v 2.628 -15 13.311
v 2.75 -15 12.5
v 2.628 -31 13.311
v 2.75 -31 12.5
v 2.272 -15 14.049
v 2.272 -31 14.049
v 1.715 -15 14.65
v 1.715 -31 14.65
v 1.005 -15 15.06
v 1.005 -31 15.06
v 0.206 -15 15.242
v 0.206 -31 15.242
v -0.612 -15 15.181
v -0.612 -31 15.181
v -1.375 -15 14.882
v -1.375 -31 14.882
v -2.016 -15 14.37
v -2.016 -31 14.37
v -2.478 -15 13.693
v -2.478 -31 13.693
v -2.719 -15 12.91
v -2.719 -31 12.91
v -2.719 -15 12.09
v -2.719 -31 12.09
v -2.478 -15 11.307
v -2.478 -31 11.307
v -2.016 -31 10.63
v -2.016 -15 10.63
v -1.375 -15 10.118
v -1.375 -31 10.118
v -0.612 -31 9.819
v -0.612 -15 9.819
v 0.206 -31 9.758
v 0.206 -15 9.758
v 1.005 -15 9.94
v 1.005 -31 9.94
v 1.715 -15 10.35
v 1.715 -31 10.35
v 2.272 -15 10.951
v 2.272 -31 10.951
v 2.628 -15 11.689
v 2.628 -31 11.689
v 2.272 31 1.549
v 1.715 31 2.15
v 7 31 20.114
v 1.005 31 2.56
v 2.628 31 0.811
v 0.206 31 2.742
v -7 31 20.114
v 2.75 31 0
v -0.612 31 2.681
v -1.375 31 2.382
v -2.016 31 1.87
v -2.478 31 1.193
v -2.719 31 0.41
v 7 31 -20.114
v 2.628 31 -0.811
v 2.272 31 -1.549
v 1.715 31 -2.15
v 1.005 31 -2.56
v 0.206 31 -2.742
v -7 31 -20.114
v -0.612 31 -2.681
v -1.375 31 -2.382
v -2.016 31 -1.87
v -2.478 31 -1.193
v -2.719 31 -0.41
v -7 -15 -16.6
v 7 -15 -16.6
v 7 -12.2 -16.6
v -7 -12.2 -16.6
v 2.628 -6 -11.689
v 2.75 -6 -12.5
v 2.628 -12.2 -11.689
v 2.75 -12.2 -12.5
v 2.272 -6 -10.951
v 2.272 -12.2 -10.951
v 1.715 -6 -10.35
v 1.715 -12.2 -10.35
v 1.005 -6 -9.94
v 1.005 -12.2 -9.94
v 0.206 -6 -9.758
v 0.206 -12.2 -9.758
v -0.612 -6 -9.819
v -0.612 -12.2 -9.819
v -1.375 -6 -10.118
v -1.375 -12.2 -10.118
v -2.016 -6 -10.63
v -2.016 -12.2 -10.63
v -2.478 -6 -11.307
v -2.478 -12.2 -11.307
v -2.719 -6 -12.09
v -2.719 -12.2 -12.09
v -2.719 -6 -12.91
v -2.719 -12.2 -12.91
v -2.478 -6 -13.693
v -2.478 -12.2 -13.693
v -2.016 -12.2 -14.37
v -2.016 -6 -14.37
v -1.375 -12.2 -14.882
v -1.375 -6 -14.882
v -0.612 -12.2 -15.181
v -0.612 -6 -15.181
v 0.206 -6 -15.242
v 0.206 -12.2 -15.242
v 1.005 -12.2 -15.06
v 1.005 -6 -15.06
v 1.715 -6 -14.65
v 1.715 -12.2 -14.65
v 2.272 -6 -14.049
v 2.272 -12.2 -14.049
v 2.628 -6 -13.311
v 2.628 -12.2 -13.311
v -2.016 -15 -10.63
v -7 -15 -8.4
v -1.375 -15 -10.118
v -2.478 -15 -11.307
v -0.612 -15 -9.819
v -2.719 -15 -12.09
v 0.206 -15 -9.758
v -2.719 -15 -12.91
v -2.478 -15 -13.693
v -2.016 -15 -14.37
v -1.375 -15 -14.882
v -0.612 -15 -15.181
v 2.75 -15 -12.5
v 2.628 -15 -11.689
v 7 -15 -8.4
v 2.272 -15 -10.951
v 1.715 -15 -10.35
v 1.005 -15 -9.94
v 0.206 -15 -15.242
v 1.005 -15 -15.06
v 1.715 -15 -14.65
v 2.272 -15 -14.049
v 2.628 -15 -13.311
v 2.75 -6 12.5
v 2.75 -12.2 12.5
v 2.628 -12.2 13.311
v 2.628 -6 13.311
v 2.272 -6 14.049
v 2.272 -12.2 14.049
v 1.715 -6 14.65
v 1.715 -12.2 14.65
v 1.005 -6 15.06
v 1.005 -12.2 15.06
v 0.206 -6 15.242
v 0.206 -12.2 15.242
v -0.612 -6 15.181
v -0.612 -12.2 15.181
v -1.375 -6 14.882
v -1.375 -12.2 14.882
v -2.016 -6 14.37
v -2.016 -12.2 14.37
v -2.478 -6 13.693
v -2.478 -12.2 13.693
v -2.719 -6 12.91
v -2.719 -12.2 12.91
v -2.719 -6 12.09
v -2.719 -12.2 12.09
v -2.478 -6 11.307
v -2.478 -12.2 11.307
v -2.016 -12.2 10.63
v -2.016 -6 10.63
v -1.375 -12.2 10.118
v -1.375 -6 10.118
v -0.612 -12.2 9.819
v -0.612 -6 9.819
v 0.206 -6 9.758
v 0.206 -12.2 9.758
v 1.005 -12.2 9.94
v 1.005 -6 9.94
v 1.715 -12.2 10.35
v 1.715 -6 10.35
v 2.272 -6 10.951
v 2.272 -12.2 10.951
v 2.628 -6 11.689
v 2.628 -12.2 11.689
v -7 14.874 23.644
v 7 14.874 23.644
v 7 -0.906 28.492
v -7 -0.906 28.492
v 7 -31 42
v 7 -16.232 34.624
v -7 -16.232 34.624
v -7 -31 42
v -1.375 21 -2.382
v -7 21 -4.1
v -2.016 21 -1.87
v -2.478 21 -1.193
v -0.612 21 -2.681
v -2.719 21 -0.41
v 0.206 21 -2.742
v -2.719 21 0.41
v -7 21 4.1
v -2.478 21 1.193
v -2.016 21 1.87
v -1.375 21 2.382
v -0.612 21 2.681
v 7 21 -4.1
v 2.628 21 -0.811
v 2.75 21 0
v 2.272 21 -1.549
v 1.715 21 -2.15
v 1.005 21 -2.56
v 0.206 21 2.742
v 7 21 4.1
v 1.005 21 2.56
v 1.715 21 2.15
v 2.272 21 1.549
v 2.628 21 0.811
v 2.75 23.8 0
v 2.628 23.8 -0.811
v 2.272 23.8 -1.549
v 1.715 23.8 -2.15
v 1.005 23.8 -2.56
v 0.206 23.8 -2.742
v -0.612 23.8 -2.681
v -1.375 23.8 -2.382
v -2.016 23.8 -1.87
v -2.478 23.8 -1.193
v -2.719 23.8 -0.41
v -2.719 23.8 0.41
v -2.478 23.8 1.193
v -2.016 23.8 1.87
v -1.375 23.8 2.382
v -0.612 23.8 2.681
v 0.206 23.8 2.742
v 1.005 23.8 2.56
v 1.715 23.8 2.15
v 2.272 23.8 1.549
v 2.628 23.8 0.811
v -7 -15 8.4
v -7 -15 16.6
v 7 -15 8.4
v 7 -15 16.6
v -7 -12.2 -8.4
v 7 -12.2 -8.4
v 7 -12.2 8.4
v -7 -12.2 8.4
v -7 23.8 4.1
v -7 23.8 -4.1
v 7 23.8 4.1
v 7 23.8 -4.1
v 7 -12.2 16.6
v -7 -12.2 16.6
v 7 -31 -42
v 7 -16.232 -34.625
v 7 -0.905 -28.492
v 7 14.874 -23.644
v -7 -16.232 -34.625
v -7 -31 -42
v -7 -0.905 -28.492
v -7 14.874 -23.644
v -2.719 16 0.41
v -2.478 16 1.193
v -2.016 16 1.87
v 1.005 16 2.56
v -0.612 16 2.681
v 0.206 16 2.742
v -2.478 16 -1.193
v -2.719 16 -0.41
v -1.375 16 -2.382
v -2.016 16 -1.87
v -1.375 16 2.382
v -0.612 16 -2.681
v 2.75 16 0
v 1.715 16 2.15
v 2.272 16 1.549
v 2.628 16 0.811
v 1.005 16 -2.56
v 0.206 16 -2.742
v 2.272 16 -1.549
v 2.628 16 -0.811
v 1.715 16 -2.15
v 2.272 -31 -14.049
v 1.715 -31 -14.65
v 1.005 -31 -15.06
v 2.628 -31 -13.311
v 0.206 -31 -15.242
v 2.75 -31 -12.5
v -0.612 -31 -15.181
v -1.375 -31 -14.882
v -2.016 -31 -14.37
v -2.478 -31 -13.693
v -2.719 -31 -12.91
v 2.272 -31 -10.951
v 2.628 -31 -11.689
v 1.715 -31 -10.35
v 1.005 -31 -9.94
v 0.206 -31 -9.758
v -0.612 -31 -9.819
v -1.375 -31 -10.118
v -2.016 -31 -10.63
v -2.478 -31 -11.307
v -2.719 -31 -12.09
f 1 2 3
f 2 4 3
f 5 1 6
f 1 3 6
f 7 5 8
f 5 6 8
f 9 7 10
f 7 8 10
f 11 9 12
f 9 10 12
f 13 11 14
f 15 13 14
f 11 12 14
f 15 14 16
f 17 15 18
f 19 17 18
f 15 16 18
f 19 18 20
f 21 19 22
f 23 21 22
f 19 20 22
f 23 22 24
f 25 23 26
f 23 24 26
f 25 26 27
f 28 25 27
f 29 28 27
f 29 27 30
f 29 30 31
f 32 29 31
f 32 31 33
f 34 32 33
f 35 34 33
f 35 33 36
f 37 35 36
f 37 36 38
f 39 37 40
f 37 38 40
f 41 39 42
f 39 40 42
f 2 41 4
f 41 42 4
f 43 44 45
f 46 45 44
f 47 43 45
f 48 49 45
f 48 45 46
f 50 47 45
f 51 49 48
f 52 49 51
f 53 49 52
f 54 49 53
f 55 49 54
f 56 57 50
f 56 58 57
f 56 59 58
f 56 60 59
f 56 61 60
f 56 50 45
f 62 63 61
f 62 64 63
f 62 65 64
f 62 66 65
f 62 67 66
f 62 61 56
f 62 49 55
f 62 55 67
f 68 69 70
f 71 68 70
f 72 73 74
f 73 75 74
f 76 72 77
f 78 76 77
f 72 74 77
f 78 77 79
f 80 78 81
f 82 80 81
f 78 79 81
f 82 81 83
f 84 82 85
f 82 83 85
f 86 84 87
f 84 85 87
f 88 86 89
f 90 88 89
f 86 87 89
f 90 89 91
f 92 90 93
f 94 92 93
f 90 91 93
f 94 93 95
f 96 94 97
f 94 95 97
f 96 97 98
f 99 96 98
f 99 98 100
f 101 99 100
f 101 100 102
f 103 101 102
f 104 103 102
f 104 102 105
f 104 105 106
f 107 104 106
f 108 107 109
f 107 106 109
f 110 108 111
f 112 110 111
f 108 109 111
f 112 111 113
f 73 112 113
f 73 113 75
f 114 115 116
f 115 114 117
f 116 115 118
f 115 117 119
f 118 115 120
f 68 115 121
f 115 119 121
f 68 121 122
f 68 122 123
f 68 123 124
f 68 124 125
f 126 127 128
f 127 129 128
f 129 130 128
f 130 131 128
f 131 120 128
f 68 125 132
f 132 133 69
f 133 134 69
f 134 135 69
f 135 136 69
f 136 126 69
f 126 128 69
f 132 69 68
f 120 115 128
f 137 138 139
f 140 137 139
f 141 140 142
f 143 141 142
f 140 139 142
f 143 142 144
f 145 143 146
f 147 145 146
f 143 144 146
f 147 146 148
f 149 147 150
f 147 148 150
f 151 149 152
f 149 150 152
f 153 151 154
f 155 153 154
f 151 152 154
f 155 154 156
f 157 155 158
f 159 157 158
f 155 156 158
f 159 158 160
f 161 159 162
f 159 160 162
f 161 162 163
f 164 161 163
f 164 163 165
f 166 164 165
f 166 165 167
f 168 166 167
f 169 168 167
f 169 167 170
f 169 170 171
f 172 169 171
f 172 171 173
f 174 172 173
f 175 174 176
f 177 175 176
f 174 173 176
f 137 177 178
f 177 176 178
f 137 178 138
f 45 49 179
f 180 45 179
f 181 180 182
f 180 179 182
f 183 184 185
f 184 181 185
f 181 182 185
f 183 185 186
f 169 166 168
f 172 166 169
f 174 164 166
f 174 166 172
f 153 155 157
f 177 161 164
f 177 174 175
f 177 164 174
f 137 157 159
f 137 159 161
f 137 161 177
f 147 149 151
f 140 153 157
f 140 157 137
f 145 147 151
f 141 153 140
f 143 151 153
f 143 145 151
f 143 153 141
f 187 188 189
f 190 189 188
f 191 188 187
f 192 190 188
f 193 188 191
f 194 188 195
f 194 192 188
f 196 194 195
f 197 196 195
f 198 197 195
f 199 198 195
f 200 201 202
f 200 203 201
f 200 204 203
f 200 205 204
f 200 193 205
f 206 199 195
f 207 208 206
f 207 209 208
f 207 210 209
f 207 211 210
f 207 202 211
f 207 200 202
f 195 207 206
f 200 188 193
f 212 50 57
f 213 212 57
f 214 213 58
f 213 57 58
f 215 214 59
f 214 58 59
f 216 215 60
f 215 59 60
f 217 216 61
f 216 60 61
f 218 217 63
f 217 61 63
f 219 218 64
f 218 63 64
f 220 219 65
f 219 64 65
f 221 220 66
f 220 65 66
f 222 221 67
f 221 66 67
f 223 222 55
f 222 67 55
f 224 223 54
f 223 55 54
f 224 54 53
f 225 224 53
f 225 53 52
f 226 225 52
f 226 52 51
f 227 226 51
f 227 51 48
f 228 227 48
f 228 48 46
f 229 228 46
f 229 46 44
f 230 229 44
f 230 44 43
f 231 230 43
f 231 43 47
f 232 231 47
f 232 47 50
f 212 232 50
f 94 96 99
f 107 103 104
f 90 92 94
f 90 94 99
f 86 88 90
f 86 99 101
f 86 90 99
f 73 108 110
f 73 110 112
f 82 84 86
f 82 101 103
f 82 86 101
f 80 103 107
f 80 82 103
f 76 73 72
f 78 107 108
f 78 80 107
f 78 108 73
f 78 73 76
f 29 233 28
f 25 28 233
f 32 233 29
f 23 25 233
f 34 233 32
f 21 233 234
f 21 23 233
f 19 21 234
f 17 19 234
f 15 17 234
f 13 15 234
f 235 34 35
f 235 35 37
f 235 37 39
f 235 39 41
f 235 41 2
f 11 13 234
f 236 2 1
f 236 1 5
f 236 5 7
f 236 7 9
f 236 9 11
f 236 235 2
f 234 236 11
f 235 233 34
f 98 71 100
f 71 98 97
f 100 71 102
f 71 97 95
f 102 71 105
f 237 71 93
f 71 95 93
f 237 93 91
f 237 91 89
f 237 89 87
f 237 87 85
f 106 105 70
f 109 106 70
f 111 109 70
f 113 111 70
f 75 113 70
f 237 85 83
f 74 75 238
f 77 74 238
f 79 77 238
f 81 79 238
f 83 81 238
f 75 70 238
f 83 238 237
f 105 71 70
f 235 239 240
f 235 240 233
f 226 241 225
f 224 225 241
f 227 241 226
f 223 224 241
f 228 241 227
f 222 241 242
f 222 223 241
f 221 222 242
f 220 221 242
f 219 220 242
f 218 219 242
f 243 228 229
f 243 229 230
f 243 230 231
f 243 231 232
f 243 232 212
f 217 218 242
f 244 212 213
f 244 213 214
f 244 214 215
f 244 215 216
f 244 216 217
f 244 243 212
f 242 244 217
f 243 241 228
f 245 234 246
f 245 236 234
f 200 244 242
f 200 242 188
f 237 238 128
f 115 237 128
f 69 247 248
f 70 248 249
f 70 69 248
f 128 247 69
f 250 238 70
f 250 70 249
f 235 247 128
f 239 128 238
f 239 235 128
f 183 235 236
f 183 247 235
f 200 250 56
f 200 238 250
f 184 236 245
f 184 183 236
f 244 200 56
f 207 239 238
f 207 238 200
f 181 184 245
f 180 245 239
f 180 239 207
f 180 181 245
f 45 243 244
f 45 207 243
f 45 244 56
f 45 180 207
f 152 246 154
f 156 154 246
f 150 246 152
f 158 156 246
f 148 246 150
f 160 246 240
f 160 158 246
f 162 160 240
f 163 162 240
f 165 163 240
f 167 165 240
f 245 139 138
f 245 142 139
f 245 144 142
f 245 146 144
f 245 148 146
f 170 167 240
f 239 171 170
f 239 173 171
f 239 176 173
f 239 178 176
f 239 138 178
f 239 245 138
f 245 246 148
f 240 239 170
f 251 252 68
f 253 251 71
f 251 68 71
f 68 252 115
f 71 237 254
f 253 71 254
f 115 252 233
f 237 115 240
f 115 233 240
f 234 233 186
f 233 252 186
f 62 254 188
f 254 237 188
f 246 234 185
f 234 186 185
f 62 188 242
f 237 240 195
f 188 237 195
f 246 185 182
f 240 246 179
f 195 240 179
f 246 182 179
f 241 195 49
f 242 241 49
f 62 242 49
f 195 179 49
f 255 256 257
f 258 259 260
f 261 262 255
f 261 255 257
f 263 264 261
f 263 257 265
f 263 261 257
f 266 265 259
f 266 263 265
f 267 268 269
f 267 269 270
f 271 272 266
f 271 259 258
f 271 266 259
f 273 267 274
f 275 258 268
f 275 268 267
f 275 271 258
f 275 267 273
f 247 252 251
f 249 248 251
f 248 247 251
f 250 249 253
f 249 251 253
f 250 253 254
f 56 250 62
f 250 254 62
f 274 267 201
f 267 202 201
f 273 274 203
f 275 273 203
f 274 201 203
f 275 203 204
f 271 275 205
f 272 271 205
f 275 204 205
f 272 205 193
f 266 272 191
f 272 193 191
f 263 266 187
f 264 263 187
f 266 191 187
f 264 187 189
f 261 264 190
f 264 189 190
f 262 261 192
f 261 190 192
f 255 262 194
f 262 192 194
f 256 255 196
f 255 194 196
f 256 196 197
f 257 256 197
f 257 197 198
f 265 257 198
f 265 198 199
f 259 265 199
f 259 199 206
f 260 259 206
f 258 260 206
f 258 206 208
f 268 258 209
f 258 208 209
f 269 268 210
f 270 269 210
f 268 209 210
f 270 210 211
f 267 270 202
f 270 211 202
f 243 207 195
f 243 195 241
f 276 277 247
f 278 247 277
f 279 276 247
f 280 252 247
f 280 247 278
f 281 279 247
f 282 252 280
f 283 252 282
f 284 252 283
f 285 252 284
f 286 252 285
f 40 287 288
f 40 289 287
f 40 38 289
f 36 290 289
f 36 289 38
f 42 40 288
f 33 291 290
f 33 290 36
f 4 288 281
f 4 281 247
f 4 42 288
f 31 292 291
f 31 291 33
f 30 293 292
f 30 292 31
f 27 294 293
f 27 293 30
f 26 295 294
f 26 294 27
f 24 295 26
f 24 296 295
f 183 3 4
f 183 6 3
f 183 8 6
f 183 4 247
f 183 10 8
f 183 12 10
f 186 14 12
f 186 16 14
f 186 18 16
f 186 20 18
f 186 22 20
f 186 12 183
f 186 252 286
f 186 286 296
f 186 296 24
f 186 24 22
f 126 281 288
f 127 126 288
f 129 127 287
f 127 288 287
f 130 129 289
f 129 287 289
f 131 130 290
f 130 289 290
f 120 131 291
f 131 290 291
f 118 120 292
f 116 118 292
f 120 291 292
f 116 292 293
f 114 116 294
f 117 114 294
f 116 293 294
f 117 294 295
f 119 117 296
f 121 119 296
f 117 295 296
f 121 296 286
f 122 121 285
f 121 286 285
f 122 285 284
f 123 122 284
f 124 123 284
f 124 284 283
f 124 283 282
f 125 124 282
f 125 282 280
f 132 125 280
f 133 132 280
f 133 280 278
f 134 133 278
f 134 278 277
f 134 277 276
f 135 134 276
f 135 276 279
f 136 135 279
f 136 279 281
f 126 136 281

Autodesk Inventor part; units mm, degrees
ref_plane "YZ Plane" through (0, 0, 0) normal (1, 0, 0) x (0, 1, 0)
ref_plane "XZ Plane" through (0, 0, 0) normal (0, 1, 0) x (-1, 0, 0)
ref_plane "XY Plane" through (0, 0, 0) normal (0, 0, 1) x (1, 0, 0)
sketch "Sketch1" plane through (0, 0, 0) normal (1, 0, 0) x (0, 1, 0)
  arc A0 (31, -20.1145) -> (-31, -42) centre (65.6672, -217.087) ccw
  line L0 (-31, 42) -> (31, 42) construction
  line L1 (31, 42) -> (31, -42) construction
  line L2 (31, -42) -> (-31, -42) construction
  line L3 (-31, -42) -> (-31, 42)
  line L4 (31, 0) -> (-31, 0) construction
  arc A1 (-31, 42) -> (31, 20.1145) centre (65.6672, 217.087) ccw
  line L5 (31, 20.1145) -> (31, -20.1145)
  point P0 (0, 0)
  point P1 (0, 42)
  dimension "d0" = 400
  dimension "d1" = 62
  dimension "d2" = 84
  dimension "d23" = 40.2289
extrude "Extrusion1" add sketch "Sketch1" along normal mid plane 14
sketch "Sketch2" plane through (7, 0, 0) normal (1, 0, 0) x (0, 0, -1)
  arc A0 (-42, -31) -> (-20.1145, 31) centre (-217.087, 65.6672) ccw construction
  line L0 (-42, -31) -> (42, -31) construction
  arc A1 (20.1145, 31) -> (42, -31) centre (217.087, 65.6672) ccw construction
  line L1 (20.1145, 31) -> (-20.1145, 31) construction
  line L2 (-16.6, -12.2) -> (-8.4, -12.2)
  line L3 (-8.4, -12.2) -> (-8.4, -15)
  line L4 (-8.4, -15) -> (-16.6, -15)
  line L5 (-16.6, -15) -> (-16.6, -12.2)
  line L6 (0, 0) -> (0, -31) construction
  line L7 (-42, -31) -> (42, -31) construction
  line L8 (16.6, -12.2) -> (8.4, -12.2)
  line L9 (8.4, -12.2) -> (8.4, -15)
  line L10 (8.4, -15) -> (16.6, -15)
  line L11 (16.6, -15) -> (16.6, -12.2)
  line L12 (-4.1, 23.8) -> (4.1, 23.8)
  line L13 (4.1, 23.8) -> (4.1, 21)
  line L14 (4.1, 21) -> (-4.1, 21)
  line L15 (-4.1, 21) -> (-4.1, 23.8)
  point P0 (12.5, -12.2)
  point P1 (-12.5, -12.2)
  point P2 (0, 23.8)
  dimension "d6" = 8.2
  dimension "d7" = 2.8
  dimension "d8" = 16
  dimension "d9" = 25
  dimension "d16" = 8.2
  dimension "d17" = 2.8
  dimension "d19" = 10
extrude "Extrusion2" cut sketch "Sketch2" against normal through all
sketch "Sketch3" plane through (-7, -31, -42) normal (0, -1, 0) x (1, 0, 0)
  line L0 (0, 0) -> (14, 0) construction
  line L1 (14, 84) -> (14, 0) construction
  line L2 (0, 84) -> (14, 84) construction
  line L3 (0, 0) -> (0, 84) construction
  line L4 (14, 42) -> (0, 42) construction
  line L5 (0, 0) -> (0, 84) construction
  line L6 (0, 84) -> (14, 84) construction
  line L7 (7, 84) -> (7, 0) construction
  line L8 (0, 0) -> (14, 0) construction
  circle A0 centre (7, 54.5) radius 2.75
  circle A1 centre (7, 29.5) radius 2.75
  point P0 (7, 42)
  dimension "d12" = 5.5
  dimension "d13" = 25
extrude "Extrusion3" cut sketch "Sketch3" against normal blind 25
sketch "Sketch4" plane through (-7, 31, 20.1145) normal (0, 1, 0) x (1, 0, 0)
  line L0 (14, 0) -> (0, 0) construction
  line L1 (14, 40.2289) -> (14, 0) construction
  line L2 (0, 40.2289) -> (14, 40.2289) construction
  line L3 (0, 0) -> (0, 40.2289) construction
  line L4 (0, 20.1145) -> (14, 20.1145) construction
  line L5 (14, 16.0145) -> (14, 24.2145) construction
  line L6 (14, 0) -> (0, 0) construction
  line L7 (7, 0) -> (7, 40.2289) construction
  line L8 (0, 40.2289) -> (14, 40.2289) construction
  circle A0 centre (7, 20.1145) radius 2.75
  dimension "d20" = 5.5
extrude "Extrusion4" cut sketch "Sketch4" against normal blind 15
properties part number "cuerpo_obj1"
